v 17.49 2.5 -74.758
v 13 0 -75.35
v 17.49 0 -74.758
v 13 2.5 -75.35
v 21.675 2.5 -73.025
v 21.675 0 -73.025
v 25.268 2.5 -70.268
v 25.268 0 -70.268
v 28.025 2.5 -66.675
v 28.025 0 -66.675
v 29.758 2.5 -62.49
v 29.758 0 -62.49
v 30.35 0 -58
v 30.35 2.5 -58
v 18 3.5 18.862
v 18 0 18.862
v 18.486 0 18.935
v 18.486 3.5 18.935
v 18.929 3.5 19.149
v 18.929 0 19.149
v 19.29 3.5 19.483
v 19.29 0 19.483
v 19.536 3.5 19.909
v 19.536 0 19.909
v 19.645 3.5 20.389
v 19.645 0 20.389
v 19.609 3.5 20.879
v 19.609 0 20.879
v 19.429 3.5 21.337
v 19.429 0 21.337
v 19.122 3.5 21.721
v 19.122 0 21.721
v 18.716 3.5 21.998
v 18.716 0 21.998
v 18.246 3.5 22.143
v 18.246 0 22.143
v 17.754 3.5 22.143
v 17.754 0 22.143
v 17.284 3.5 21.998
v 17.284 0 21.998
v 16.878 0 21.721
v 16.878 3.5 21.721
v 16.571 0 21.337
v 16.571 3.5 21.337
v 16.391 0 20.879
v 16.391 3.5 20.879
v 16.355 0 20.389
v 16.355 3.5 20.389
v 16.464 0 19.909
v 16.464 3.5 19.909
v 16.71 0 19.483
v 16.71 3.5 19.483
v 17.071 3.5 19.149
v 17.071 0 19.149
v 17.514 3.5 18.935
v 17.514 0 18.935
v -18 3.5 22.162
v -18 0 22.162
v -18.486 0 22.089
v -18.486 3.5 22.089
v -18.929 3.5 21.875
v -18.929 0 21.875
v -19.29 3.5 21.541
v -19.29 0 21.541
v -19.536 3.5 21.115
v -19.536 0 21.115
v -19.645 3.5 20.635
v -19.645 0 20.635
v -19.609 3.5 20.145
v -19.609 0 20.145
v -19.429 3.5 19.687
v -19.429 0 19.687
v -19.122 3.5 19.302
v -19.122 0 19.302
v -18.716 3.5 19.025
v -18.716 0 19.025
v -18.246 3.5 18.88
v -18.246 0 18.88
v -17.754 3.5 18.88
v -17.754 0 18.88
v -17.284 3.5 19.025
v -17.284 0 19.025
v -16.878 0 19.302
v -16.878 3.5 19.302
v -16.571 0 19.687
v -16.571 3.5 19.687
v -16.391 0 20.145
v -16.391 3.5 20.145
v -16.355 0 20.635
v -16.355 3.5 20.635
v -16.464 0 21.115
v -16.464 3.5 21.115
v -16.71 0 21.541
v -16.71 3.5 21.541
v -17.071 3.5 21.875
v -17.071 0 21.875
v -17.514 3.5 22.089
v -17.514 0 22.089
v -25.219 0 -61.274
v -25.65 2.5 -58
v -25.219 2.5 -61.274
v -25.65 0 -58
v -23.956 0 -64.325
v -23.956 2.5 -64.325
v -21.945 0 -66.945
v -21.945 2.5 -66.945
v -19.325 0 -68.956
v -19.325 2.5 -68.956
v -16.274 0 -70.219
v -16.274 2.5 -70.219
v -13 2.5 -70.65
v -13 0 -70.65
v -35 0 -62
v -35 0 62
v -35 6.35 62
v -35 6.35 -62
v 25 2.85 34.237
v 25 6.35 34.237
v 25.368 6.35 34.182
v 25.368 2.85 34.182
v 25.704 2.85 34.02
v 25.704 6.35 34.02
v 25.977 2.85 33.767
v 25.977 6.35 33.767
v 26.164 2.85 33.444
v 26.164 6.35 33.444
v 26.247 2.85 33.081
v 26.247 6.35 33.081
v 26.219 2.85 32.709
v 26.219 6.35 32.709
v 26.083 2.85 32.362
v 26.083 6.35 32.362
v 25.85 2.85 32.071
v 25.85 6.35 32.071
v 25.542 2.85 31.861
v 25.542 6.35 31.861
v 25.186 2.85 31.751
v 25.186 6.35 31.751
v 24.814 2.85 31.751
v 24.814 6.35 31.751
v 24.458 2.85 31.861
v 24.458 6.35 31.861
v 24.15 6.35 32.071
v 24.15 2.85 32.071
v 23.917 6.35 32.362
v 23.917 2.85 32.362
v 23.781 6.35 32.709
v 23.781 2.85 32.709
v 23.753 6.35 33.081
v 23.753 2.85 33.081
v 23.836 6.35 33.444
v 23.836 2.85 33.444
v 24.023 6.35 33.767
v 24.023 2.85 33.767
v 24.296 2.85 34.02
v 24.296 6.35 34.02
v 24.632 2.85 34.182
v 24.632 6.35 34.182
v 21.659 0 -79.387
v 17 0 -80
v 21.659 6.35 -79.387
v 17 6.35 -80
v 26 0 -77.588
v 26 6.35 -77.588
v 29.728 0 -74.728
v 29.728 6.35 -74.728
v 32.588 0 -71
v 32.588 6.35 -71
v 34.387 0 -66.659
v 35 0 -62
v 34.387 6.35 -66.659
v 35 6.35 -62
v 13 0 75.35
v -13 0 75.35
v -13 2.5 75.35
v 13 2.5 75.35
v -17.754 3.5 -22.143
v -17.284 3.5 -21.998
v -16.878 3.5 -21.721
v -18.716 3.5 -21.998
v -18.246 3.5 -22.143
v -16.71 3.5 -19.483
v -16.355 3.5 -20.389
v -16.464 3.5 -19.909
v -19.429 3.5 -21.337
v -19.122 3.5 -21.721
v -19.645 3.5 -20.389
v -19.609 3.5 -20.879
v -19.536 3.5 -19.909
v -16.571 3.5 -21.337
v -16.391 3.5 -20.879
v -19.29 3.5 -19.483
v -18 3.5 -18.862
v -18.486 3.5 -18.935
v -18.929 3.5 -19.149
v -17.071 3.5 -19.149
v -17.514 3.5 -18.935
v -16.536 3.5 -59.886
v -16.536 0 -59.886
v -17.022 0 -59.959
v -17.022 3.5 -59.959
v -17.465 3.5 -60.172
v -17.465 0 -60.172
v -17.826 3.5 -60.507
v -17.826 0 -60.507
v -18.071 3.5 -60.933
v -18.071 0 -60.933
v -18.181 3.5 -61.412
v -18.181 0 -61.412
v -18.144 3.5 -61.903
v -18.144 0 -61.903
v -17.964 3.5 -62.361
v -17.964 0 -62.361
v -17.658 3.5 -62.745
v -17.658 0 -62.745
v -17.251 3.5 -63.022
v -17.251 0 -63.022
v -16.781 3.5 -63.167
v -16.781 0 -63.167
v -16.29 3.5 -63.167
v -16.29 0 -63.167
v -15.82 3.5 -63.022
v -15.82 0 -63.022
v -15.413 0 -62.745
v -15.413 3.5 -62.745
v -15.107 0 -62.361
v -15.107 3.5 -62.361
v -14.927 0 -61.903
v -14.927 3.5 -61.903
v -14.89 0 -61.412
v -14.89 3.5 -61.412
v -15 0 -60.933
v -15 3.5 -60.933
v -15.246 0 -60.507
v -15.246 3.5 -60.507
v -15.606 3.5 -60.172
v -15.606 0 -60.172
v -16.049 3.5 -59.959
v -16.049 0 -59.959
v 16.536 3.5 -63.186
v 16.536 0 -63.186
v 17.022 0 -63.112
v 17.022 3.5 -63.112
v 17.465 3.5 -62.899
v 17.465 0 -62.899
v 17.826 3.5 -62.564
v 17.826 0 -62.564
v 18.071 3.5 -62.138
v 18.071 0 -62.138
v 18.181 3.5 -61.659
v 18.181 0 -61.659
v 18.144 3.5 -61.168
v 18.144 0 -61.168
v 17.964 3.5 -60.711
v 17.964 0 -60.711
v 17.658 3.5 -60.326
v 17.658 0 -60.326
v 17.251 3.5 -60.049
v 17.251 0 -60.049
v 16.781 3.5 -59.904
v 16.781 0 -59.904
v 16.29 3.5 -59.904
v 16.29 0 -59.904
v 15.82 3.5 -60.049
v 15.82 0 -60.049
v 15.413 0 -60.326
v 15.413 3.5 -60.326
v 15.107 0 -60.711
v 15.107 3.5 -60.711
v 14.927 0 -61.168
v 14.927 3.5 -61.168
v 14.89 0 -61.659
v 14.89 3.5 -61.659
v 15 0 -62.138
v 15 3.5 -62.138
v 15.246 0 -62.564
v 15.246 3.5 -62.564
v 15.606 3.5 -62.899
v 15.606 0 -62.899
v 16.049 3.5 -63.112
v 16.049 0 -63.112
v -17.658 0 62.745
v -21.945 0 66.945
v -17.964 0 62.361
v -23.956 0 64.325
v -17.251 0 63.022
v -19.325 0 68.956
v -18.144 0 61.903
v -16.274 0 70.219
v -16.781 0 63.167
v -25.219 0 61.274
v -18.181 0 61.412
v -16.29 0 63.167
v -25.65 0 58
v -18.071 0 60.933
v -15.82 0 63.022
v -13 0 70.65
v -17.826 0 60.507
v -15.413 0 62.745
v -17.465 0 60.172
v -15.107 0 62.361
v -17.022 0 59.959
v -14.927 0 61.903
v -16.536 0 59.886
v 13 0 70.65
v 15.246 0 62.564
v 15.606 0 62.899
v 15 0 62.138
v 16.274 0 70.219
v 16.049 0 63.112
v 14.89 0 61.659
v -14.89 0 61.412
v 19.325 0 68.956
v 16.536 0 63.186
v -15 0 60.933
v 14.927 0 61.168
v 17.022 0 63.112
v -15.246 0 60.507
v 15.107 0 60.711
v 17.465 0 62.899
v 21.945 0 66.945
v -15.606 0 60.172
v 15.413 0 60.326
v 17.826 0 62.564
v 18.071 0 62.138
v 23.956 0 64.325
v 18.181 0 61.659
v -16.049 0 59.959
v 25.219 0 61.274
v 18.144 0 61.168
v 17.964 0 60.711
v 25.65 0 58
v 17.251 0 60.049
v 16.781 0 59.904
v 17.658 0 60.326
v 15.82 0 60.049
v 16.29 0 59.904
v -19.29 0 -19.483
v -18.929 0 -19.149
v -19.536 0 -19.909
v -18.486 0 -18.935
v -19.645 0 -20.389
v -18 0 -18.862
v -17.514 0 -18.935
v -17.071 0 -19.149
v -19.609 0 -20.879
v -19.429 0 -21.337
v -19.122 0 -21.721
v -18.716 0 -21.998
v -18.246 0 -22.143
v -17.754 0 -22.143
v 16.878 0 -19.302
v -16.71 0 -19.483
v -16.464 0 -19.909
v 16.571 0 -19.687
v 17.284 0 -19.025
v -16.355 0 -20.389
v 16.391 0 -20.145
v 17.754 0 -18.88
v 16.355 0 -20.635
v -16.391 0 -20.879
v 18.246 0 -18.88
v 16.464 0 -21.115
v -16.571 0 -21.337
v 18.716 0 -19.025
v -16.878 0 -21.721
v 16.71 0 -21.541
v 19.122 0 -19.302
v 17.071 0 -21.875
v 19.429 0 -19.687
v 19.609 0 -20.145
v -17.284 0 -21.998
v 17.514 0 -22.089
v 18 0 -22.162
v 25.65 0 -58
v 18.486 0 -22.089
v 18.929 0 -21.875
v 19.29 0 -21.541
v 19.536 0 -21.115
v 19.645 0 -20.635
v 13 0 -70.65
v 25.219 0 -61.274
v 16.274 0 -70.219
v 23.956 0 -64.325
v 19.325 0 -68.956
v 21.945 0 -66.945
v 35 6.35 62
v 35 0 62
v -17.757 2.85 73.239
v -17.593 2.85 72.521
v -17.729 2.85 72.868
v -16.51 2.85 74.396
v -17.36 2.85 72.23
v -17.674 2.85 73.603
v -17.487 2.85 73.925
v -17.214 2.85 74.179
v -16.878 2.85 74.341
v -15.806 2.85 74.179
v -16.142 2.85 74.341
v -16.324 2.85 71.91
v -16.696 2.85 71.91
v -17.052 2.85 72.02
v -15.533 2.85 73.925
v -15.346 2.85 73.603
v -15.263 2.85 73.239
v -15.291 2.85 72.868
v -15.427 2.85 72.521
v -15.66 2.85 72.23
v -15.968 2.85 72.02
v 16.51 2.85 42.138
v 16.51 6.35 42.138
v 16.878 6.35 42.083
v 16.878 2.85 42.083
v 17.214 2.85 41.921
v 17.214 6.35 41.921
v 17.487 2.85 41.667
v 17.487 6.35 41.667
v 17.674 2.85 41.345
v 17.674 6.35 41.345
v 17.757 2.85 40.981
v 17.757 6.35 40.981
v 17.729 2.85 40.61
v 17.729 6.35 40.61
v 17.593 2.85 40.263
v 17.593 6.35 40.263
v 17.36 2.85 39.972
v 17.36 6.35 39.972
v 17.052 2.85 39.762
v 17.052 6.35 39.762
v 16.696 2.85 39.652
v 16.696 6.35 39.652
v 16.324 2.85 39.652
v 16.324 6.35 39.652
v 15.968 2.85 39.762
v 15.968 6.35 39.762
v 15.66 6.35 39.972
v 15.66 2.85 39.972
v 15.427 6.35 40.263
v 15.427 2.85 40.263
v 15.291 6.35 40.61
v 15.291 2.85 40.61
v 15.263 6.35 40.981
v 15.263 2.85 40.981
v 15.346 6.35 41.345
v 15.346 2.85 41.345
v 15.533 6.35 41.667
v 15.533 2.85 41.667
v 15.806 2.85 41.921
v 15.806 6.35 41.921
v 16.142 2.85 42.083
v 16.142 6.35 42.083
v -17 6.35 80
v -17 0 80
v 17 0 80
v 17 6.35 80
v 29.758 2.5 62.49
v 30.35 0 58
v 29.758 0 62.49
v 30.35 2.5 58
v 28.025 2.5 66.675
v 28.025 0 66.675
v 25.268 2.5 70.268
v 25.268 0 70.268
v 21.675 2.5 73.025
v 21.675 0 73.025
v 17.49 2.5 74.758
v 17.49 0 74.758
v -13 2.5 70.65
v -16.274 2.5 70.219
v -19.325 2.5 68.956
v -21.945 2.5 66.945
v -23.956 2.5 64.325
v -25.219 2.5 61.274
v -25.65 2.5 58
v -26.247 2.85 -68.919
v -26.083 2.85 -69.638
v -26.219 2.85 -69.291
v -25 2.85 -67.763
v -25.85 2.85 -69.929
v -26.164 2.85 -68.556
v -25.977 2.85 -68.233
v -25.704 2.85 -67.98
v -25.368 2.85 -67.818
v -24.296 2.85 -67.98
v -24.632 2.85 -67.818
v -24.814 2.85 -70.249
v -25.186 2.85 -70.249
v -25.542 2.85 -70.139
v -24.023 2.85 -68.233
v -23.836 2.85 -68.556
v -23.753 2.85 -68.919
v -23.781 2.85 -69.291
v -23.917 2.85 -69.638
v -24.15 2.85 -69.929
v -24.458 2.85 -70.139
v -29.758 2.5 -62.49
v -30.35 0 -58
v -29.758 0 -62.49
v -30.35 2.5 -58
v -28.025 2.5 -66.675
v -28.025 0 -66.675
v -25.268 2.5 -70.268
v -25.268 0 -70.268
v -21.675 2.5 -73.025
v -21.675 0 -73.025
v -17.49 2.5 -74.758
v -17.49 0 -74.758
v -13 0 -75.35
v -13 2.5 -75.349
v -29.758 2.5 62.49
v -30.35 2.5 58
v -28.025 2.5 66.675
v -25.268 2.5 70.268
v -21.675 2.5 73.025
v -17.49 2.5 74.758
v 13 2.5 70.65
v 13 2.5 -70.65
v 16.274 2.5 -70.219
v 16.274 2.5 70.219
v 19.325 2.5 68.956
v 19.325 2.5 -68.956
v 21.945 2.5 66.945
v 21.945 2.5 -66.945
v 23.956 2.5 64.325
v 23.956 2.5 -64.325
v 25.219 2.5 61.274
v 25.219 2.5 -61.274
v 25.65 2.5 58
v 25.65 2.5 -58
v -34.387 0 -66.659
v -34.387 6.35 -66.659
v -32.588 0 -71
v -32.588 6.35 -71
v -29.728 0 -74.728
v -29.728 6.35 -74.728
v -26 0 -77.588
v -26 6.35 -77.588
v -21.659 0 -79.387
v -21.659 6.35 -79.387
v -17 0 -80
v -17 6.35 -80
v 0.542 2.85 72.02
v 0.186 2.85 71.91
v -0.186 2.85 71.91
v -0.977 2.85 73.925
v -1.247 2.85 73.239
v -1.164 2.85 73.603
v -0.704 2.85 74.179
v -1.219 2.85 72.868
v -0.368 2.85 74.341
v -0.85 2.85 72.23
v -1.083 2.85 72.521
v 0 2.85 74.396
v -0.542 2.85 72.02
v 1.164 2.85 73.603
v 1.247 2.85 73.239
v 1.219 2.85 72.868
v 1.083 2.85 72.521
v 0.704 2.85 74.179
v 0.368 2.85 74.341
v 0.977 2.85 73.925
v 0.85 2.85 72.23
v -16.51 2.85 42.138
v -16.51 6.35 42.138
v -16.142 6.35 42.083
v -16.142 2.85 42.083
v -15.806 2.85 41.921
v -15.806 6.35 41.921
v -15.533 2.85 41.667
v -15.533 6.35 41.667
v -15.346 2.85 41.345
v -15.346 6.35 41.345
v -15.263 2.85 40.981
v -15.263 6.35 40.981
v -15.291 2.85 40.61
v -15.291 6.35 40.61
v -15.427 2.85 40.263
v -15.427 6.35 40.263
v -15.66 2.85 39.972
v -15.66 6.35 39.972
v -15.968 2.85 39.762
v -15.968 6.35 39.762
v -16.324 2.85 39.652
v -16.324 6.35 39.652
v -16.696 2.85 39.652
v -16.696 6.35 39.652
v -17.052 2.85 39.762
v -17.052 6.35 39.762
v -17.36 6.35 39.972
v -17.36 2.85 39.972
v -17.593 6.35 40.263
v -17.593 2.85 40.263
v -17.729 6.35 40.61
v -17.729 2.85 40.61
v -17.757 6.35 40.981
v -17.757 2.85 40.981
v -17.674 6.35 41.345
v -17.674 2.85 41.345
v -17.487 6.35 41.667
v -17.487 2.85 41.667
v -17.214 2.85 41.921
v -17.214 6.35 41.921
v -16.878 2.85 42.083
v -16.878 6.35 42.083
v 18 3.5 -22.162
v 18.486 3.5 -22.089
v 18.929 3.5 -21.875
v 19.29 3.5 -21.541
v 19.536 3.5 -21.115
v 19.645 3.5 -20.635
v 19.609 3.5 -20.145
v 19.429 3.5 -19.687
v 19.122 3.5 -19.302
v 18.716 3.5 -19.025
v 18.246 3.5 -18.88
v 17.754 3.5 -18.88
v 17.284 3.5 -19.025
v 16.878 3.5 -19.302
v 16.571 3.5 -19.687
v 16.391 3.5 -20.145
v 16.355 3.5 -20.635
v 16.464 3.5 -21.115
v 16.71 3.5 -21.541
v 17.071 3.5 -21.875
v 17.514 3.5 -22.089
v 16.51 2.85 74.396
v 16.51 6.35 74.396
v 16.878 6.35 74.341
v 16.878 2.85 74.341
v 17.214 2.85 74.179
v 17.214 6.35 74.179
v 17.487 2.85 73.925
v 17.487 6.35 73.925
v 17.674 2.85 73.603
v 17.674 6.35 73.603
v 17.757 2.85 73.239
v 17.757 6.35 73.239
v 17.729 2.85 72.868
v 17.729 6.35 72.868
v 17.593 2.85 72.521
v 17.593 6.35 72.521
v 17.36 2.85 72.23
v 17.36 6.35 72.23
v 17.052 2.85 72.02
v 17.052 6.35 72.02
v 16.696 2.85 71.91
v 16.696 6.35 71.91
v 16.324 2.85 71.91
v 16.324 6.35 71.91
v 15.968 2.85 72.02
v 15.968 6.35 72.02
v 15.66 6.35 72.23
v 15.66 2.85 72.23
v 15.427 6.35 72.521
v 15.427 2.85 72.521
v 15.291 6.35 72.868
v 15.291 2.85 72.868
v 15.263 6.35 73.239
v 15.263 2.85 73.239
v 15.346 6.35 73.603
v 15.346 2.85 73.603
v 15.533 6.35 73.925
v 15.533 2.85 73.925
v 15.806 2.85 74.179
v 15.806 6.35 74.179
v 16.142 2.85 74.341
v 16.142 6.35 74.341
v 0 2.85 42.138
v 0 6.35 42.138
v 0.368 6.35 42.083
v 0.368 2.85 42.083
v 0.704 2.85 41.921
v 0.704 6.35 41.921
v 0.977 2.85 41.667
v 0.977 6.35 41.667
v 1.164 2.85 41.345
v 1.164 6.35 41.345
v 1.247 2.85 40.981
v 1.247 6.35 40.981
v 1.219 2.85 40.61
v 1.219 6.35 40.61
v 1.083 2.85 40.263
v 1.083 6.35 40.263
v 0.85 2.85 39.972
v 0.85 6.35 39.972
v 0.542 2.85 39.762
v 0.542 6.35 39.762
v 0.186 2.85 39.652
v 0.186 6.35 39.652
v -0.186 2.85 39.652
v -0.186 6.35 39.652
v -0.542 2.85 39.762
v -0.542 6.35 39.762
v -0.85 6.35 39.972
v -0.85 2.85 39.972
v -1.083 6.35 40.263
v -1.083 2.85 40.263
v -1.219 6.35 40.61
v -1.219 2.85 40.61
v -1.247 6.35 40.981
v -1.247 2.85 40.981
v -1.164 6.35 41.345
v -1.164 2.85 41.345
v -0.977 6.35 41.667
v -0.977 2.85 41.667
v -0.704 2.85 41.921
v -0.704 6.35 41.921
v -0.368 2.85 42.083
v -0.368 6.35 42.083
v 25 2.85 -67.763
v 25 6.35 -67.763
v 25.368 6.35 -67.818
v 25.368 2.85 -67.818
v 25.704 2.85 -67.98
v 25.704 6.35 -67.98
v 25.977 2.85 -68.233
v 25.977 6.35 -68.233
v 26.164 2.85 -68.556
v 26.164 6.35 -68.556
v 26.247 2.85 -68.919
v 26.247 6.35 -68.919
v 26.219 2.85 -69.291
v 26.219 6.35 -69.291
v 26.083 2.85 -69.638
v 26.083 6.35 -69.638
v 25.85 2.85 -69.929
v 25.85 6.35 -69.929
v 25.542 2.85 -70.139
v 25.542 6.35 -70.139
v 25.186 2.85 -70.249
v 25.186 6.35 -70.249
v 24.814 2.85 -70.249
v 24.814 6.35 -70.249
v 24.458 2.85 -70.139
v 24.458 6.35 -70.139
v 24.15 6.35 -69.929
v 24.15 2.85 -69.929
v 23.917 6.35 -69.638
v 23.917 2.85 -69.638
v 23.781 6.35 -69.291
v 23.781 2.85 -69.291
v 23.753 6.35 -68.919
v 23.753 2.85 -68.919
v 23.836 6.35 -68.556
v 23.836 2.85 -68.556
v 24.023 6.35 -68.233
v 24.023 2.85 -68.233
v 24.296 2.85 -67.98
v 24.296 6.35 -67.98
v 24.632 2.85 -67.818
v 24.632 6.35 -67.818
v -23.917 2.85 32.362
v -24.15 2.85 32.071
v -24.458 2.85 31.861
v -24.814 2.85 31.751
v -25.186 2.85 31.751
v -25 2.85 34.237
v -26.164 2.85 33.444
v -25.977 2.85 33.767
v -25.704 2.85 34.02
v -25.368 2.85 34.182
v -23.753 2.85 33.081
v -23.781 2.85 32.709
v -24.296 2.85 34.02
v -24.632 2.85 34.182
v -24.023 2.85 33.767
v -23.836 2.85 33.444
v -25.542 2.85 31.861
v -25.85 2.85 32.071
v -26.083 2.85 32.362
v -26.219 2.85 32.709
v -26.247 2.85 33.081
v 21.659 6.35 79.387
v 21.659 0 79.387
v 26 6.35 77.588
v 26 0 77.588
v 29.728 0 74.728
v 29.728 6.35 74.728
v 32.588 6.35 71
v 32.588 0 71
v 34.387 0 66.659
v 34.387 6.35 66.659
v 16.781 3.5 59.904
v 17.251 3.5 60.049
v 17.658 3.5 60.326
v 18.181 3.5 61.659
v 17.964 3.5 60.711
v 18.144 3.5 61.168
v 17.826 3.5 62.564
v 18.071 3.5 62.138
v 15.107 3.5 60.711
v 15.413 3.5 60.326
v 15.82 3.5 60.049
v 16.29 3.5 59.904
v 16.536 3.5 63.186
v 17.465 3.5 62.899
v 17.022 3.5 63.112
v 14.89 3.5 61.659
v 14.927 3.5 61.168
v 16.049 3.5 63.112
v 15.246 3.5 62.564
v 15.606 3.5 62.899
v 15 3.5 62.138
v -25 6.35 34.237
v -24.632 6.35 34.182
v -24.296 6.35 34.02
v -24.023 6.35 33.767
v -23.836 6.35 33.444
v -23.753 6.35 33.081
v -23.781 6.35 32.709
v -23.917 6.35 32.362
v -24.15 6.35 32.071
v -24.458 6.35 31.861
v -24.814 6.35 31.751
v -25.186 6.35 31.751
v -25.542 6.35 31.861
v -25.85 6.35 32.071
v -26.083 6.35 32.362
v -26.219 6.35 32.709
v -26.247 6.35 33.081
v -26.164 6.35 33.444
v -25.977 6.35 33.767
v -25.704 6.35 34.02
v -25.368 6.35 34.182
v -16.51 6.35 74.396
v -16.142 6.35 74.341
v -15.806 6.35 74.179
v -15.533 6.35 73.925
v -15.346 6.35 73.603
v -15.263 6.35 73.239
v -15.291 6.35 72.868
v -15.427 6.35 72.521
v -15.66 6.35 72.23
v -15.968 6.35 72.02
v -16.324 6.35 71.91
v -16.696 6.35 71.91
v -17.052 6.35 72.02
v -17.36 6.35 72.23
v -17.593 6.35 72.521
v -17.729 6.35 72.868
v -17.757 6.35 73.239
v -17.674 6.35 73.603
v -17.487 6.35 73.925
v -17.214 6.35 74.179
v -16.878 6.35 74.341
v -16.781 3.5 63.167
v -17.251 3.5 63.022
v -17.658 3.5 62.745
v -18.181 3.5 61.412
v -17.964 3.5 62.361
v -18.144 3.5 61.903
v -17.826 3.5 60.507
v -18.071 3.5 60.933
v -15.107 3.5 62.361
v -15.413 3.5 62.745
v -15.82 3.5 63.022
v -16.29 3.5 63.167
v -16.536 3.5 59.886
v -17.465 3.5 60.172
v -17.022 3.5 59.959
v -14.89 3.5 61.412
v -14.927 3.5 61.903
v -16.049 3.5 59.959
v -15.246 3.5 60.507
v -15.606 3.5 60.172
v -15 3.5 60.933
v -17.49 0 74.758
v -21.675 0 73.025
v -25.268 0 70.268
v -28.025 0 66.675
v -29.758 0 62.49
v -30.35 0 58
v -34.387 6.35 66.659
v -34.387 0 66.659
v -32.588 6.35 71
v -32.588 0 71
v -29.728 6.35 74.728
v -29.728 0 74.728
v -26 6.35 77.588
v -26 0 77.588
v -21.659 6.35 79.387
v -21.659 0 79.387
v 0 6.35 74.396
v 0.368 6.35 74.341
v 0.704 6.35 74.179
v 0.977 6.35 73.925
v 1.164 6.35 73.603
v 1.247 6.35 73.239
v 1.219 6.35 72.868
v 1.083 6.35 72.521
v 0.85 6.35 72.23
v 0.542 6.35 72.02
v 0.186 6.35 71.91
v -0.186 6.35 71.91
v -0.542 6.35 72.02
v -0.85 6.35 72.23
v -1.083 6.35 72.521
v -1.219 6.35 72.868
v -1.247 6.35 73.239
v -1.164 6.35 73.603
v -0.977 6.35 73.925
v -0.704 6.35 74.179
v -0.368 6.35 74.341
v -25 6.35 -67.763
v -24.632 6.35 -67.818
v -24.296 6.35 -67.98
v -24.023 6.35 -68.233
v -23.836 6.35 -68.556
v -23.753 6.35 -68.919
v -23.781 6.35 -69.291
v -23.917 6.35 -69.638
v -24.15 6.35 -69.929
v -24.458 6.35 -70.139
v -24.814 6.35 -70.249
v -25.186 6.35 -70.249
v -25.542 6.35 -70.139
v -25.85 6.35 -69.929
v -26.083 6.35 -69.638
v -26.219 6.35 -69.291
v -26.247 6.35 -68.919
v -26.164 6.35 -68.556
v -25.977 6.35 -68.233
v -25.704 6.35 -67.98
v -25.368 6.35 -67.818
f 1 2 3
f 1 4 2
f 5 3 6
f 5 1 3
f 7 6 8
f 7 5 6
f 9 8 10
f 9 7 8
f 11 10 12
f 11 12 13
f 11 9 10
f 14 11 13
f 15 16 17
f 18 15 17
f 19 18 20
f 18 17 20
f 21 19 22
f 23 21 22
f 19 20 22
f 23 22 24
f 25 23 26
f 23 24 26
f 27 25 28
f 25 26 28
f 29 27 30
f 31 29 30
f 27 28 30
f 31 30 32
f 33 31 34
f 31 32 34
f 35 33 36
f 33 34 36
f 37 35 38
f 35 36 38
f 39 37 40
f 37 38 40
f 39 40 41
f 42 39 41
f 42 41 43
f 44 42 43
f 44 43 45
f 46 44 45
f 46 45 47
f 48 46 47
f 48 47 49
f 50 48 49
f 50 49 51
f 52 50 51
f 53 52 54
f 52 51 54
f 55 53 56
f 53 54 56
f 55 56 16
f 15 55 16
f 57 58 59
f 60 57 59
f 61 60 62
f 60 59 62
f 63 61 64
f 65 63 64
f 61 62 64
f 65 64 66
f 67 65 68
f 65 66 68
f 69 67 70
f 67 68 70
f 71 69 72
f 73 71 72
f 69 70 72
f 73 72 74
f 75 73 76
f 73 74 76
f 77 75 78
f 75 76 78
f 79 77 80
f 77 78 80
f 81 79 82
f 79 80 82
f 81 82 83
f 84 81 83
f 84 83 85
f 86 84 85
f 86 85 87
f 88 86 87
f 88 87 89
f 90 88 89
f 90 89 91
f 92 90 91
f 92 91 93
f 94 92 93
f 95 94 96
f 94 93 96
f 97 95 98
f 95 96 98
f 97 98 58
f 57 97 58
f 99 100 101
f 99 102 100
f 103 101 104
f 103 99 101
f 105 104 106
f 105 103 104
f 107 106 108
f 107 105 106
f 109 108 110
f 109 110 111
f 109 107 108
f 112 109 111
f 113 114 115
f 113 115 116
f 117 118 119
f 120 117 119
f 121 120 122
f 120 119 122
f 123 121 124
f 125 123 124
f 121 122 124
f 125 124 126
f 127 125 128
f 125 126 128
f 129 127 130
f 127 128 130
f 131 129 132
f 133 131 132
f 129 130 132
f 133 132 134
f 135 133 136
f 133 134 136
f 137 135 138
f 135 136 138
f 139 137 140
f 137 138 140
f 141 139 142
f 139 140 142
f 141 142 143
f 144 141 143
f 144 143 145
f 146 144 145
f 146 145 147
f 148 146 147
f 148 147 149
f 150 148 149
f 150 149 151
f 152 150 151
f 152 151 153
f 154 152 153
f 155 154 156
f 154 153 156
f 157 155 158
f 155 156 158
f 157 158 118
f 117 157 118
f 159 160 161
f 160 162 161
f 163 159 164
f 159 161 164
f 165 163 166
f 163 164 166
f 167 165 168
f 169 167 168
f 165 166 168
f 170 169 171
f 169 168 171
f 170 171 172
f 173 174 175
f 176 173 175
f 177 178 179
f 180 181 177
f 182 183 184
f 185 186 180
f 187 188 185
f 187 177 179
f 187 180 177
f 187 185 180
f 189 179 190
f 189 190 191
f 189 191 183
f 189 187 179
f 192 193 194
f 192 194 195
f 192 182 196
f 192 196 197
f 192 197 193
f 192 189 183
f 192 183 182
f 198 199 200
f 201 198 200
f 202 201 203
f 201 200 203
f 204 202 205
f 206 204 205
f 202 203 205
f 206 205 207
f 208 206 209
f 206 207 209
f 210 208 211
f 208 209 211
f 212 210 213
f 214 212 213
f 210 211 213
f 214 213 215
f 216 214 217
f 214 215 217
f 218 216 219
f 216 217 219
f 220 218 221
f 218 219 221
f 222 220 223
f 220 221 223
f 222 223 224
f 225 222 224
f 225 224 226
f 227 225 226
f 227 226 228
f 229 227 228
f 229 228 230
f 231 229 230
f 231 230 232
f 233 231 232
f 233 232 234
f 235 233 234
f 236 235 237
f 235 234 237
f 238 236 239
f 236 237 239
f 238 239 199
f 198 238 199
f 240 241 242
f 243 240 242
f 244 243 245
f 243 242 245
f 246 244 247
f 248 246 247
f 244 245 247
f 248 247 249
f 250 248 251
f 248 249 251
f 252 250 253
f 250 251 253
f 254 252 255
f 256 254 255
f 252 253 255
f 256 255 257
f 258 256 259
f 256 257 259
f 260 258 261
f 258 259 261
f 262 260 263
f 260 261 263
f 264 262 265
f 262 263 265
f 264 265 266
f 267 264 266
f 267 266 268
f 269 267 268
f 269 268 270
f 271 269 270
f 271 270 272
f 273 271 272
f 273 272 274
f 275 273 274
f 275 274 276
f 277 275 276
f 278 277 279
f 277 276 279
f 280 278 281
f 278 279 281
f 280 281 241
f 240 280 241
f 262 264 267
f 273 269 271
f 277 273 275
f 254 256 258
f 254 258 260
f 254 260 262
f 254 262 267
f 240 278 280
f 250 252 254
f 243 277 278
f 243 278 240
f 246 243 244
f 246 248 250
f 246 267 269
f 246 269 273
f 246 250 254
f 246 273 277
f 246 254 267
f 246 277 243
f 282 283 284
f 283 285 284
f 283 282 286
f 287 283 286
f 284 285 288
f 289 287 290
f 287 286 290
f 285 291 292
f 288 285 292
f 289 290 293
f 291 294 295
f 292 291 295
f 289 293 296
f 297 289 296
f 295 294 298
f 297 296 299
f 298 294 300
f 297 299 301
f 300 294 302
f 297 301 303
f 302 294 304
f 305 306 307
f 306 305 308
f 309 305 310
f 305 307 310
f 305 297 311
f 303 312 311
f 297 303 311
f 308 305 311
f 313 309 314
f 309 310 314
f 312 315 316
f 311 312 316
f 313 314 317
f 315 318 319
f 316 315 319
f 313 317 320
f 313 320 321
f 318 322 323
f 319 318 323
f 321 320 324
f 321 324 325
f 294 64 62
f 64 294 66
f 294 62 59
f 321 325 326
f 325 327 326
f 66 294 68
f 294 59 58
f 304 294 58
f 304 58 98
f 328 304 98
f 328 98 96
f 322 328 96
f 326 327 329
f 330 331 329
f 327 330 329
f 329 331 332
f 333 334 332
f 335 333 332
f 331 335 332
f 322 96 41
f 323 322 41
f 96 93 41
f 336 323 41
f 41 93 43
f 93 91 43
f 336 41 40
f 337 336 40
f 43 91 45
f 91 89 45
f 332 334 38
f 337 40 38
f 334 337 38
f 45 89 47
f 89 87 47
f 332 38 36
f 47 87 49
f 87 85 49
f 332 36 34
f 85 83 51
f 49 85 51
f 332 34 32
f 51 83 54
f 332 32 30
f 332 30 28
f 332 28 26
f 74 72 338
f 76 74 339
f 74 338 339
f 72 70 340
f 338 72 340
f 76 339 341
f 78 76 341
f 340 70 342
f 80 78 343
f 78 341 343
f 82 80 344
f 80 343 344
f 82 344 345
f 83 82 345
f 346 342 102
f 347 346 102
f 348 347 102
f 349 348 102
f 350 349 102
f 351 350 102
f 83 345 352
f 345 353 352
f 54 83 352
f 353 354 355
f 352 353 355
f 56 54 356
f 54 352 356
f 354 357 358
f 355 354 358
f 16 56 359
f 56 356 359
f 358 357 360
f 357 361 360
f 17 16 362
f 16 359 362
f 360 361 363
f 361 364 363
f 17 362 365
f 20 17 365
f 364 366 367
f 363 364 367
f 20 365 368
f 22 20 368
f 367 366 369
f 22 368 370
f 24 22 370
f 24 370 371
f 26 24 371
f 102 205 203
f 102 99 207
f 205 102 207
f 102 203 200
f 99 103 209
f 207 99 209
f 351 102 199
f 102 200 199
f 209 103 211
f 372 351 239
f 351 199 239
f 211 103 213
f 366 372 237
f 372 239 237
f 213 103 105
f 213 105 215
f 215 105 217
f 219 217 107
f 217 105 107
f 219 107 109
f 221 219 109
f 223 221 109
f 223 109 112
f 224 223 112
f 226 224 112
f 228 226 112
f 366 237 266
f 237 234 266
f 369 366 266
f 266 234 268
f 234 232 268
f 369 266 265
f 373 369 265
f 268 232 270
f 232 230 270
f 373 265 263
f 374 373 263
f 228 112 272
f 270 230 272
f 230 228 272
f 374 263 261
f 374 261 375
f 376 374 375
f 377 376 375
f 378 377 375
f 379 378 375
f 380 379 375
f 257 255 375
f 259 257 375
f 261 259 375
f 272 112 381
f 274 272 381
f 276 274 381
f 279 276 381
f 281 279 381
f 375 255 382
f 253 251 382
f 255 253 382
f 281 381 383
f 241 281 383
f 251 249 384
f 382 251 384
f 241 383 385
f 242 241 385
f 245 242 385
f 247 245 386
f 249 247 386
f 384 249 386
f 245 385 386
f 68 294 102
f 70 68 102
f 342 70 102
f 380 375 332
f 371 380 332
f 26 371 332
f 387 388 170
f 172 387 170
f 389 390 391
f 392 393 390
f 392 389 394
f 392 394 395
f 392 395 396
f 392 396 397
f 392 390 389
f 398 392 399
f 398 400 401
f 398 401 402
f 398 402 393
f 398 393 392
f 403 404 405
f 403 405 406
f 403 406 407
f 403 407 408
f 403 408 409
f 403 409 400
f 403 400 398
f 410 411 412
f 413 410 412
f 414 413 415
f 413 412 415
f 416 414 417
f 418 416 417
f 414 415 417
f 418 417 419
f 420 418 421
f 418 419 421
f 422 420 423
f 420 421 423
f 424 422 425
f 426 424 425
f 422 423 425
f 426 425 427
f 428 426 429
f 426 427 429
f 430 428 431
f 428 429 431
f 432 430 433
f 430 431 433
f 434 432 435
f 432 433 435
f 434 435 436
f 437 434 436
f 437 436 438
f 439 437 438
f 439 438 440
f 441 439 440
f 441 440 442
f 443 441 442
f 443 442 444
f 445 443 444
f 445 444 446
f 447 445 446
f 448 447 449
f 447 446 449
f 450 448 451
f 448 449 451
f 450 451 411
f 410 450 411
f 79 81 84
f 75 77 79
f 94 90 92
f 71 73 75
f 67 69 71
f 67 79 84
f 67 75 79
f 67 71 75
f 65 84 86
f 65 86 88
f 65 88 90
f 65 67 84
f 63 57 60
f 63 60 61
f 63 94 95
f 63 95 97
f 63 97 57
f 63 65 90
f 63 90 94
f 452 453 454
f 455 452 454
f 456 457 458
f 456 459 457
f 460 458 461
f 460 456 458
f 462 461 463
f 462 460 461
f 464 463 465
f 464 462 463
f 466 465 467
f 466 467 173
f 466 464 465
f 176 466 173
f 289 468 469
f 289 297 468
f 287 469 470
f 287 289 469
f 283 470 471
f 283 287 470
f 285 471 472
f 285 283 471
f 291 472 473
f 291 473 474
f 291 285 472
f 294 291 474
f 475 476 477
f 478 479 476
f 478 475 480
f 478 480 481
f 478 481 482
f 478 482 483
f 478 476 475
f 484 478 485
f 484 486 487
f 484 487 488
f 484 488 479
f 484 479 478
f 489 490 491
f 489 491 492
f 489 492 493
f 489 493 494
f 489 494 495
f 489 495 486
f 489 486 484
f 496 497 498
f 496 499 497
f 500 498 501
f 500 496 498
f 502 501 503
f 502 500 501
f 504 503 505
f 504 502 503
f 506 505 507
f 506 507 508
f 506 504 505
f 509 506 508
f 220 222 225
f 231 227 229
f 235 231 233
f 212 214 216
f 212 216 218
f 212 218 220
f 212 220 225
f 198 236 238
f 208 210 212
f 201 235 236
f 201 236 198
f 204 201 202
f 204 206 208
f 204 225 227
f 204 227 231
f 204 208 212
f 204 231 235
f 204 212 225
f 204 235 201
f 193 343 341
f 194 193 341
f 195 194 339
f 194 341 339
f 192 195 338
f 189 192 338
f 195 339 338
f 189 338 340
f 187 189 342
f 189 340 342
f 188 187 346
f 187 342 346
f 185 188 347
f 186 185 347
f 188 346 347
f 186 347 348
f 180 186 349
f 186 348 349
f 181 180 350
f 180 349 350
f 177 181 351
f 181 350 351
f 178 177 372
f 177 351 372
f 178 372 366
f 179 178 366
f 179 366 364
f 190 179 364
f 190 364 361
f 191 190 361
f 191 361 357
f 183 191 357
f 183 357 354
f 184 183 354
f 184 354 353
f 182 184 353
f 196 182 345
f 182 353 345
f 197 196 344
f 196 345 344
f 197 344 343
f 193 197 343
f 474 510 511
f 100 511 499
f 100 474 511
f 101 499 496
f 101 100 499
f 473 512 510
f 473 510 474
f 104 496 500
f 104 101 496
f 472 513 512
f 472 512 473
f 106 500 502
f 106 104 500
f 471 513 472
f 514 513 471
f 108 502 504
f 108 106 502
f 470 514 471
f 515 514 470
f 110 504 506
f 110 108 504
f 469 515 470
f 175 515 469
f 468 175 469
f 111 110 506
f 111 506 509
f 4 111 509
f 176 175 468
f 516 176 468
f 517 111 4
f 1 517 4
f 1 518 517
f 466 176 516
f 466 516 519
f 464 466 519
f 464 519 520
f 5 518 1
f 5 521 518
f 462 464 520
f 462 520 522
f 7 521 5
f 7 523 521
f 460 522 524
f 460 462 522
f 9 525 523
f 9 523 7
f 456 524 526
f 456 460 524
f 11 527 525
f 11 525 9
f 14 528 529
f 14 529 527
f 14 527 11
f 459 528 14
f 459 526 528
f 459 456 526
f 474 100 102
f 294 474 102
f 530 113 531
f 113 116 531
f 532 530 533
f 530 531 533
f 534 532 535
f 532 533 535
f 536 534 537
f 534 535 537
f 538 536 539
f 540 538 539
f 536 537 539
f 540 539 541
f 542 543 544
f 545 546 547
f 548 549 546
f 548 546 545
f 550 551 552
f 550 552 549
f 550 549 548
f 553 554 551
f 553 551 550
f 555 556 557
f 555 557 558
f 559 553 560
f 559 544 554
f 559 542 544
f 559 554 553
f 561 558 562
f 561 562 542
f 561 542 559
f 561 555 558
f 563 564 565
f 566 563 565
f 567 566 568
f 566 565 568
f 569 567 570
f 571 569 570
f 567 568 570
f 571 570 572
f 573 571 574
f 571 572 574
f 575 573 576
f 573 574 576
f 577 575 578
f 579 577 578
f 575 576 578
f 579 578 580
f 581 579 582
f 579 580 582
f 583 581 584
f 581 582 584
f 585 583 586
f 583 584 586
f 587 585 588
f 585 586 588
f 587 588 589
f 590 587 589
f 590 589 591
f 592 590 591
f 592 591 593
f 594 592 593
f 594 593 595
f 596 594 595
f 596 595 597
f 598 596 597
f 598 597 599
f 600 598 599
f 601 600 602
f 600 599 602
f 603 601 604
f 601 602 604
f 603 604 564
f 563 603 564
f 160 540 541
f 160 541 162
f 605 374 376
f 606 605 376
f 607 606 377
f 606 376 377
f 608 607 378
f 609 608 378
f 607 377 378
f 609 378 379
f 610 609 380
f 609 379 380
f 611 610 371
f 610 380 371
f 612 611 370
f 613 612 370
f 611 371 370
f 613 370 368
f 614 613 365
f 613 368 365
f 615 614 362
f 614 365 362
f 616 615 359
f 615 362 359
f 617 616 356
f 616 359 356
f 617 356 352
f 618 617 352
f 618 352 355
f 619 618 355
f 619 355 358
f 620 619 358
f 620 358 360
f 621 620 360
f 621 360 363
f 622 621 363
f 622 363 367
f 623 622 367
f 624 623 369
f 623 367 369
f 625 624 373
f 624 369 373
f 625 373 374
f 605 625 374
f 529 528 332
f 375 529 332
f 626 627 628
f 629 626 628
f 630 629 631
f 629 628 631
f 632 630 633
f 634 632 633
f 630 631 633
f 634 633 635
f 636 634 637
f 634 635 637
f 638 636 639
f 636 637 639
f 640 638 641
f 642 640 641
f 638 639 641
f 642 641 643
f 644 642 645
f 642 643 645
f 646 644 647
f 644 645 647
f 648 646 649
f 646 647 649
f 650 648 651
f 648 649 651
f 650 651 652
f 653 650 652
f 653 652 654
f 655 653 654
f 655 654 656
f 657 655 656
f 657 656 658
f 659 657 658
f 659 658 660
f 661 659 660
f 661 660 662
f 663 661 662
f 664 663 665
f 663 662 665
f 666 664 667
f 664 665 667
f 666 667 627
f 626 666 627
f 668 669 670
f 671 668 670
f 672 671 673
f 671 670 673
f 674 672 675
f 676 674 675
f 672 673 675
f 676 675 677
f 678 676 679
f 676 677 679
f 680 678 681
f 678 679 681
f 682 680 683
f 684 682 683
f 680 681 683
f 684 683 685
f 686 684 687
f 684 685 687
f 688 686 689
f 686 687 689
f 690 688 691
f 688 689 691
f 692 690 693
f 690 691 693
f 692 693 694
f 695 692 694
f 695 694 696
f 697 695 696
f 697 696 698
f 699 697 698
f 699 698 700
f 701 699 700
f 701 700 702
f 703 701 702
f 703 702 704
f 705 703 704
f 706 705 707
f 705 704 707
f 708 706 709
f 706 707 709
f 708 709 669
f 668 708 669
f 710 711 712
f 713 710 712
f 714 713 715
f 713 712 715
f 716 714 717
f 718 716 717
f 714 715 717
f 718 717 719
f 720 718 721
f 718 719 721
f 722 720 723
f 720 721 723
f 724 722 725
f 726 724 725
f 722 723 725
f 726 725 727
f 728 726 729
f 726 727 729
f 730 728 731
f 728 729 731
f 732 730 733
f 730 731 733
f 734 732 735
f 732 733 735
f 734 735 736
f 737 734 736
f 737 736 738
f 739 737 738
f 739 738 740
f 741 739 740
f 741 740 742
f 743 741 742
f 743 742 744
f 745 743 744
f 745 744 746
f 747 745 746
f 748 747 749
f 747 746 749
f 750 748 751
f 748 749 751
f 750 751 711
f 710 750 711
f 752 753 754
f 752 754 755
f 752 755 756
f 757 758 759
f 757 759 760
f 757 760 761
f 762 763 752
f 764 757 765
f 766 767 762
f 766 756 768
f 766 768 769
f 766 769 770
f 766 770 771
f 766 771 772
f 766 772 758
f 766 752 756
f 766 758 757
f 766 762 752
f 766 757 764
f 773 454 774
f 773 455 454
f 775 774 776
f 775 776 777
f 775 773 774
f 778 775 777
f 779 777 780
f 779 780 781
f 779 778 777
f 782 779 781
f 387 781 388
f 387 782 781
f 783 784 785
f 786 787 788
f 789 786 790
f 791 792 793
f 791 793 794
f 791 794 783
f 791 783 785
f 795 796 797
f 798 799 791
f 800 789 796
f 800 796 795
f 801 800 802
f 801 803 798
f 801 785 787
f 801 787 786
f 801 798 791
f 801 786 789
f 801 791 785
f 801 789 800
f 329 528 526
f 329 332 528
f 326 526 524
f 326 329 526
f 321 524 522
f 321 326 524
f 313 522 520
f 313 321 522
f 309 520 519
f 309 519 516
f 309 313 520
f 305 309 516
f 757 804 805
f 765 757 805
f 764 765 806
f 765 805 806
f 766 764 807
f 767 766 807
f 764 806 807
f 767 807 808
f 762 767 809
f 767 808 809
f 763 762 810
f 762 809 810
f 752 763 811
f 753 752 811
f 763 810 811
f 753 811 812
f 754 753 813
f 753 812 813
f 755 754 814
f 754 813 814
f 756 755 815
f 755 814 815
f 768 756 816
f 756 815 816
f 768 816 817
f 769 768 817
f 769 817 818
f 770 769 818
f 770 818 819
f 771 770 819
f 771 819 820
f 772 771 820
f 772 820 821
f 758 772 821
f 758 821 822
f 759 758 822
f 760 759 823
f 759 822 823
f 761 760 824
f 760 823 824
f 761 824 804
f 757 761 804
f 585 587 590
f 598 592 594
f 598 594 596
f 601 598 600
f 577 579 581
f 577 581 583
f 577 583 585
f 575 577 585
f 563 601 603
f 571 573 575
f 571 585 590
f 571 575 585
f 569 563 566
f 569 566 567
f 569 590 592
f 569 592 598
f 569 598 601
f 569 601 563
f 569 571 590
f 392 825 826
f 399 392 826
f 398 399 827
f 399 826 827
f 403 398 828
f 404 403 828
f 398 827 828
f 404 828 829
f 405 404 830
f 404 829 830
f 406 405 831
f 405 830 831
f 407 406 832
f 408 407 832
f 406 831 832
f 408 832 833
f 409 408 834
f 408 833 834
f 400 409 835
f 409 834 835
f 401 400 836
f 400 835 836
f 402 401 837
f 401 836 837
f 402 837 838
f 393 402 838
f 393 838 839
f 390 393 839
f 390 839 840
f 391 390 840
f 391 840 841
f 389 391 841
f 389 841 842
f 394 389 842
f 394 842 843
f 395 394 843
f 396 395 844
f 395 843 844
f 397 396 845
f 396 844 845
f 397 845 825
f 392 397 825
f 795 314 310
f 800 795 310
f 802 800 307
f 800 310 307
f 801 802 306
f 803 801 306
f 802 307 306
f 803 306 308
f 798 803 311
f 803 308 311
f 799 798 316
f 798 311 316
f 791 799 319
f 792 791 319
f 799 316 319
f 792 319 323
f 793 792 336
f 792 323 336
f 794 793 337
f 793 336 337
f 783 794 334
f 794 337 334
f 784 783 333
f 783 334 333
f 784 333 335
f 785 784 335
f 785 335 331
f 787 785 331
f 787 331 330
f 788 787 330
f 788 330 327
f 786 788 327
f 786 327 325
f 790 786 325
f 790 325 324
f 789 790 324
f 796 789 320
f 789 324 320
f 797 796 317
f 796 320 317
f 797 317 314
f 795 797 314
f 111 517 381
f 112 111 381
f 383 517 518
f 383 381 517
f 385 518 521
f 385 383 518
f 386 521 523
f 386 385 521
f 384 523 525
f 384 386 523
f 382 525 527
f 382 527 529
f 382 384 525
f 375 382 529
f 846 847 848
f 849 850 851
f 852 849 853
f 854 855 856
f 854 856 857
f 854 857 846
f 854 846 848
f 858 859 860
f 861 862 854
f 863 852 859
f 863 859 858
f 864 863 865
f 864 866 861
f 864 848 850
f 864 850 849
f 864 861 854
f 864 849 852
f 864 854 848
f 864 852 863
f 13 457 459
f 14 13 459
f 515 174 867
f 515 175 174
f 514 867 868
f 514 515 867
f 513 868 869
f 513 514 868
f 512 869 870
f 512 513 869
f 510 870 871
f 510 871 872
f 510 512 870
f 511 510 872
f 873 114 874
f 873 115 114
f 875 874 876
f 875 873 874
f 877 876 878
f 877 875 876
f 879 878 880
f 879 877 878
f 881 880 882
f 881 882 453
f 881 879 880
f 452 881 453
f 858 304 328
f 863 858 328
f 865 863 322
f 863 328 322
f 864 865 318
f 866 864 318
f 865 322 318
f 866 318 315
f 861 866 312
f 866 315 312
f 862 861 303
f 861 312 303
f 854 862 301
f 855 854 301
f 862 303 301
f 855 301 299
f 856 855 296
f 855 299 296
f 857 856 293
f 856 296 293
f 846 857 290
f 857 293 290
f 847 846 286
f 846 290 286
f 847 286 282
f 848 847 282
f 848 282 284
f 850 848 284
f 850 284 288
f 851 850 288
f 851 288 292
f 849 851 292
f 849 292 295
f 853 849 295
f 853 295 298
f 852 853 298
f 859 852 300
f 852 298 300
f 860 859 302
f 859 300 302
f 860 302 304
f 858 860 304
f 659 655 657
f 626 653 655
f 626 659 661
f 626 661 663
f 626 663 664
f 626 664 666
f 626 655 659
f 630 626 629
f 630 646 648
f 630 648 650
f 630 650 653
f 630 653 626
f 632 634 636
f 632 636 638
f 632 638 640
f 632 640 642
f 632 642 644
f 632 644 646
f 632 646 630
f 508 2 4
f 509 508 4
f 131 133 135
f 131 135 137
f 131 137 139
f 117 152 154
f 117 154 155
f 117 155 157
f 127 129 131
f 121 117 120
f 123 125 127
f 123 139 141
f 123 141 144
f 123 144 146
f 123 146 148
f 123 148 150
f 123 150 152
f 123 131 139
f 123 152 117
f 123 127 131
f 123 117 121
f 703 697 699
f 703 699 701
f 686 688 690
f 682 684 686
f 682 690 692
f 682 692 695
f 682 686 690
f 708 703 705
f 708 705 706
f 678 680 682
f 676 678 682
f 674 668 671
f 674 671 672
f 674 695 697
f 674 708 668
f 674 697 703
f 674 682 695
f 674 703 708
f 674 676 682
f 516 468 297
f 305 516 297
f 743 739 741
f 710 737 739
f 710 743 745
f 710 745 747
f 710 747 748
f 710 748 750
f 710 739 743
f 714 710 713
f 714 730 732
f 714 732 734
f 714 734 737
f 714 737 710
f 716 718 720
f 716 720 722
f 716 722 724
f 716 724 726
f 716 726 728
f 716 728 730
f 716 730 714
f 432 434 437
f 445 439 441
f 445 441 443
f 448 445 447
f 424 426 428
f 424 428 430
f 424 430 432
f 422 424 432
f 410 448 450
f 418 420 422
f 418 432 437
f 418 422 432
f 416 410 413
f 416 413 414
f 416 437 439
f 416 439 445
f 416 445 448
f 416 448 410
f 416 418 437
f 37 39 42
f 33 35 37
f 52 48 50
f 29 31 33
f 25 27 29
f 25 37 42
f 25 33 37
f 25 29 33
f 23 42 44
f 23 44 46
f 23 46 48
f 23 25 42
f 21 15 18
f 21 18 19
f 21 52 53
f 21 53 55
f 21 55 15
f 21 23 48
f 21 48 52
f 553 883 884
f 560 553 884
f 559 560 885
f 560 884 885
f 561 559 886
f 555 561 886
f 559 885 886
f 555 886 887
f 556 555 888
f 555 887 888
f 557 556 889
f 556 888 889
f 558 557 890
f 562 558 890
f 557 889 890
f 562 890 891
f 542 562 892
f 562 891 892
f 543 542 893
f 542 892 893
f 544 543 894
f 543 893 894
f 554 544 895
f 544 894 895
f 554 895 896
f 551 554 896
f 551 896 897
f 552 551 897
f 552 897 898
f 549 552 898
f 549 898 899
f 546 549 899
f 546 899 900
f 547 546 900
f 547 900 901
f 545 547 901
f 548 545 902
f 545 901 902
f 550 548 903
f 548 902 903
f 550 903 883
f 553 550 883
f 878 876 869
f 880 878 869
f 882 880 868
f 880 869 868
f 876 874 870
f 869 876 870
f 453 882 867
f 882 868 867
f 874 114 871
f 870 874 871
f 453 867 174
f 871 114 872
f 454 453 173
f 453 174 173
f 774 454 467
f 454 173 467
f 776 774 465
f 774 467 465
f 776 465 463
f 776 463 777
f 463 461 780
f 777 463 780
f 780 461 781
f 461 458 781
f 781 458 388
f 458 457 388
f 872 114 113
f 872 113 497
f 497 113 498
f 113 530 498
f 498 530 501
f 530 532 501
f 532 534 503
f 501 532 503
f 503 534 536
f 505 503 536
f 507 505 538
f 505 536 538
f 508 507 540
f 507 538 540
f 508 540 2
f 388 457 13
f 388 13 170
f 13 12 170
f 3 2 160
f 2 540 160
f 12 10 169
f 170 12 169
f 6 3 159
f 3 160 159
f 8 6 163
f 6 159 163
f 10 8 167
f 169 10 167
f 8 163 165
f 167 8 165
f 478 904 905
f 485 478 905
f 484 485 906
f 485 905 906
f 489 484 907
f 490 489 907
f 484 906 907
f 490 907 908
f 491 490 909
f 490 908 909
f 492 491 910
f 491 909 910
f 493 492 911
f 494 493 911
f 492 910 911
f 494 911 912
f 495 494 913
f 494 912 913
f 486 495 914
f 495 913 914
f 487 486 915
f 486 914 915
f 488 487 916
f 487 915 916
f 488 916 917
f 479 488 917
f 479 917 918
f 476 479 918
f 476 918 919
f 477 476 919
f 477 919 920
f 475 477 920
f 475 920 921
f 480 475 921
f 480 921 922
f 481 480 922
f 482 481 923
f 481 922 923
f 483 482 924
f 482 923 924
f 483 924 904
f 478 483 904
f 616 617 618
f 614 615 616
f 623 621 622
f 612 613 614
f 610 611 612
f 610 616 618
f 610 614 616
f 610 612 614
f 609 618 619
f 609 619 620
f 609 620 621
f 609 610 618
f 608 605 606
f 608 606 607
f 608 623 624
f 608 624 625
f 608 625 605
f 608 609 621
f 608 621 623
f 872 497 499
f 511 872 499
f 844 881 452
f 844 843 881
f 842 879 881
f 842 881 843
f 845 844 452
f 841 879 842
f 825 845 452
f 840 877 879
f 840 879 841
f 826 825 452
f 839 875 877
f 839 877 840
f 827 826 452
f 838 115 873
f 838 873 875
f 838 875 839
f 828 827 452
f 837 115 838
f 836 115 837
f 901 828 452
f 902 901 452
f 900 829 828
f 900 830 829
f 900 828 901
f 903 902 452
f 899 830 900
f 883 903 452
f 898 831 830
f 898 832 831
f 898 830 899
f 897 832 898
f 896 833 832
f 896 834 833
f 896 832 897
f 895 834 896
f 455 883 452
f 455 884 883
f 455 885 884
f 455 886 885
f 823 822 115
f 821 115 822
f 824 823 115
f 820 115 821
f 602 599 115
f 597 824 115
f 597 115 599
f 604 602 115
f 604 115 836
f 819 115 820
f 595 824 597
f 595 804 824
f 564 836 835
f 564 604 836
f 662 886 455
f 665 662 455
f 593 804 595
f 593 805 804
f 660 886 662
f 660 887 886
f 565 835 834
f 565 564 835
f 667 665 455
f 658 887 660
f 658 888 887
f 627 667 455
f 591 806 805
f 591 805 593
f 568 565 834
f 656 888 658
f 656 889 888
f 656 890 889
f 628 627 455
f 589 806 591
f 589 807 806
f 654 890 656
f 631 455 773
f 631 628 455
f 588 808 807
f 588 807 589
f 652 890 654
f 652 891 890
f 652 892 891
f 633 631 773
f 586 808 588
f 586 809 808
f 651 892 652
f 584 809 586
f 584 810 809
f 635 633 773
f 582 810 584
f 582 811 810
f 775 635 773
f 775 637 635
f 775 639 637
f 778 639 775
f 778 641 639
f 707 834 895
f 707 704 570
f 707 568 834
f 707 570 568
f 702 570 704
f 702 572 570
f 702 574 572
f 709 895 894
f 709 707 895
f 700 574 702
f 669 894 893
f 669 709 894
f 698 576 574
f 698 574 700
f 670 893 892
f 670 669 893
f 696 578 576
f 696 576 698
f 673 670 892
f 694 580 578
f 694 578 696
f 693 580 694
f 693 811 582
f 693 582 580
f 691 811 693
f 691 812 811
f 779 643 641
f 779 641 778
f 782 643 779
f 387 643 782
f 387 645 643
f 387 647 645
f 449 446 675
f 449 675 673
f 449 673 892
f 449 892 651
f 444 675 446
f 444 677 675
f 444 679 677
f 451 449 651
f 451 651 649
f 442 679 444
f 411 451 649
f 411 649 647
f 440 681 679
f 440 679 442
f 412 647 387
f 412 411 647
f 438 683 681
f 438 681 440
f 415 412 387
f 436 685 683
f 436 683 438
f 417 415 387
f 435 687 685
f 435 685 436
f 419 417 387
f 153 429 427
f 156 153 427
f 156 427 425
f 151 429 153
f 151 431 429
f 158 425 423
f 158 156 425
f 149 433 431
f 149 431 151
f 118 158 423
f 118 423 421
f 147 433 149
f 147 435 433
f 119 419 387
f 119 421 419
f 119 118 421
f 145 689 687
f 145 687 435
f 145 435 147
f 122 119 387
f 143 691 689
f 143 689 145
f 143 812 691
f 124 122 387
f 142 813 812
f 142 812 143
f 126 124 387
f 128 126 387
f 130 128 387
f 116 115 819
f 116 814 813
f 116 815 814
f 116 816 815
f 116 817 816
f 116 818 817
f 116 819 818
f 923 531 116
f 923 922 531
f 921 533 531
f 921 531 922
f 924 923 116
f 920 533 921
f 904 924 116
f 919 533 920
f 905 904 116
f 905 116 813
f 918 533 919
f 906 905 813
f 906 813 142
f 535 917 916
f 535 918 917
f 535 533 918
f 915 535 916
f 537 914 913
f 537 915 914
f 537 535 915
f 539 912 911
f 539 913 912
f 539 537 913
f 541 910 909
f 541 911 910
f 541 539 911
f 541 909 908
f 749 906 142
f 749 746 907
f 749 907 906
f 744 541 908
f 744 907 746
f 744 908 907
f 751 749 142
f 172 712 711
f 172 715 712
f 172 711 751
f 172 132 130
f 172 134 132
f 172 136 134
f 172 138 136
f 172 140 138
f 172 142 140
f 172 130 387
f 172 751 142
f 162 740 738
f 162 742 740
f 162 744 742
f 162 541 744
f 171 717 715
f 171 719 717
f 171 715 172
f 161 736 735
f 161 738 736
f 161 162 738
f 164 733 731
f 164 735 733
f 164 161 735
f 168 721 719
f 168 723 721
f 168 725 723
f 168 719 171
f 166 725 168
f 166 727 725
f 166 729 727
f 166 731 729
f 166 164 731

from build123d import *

# Parameters (mm, degrees)
SKETCH1_W           = 70
SKETCH1_H           = 160
BOSS_EXTRUDE1_DEPTH = 6.35
SKETCH7_W           = 4.699
SKETCH7_H           = 2.5
FILLET1_R           = 18
SKETCH11_R          = 1.65
CUT_EXTRUDE4_DEPTH  = 3.5
SKETCH14_R          = 1.25
CUT_EXTRUDE7_DEPTH  = 3.5


with BuildPart() as part:
    # Sketch1 → Boss-Extrude1 (new body)
    with BuildSketch(Plane(origin=(0, 0, 0), x_dir=(1, 0, 0), z_dir=(0, 1, 0))):
        Rectangle(SKETCH1_W, SKETCH1_H)
    extrude(amount=BOSS_EXTRUDE1_DEPTH)

    # Cut-Sweep2: sweep along a path in Sketch2
    with BuildLine(Plane(origin=(0, 0, 0), x_dir=(1, 0, 0), z_dir=(0, 1, 0))) as cut_sweep2_path:
        Line((-13, 73), (13, 73))
        ThreePointArc((13, 73), (23.606601718, 68.606601718), (28, 58))
        Line((28, 58), (28, -58))
        ThreePointArc((28, -58), (23.606601718, -68.606601718), (13, -73))
        Line((13, -73), (-13, -73))
        ThreePointArc((-13, -73), (-23.606601718, -68.606601718), (-28, -58))
        Line((-28, -58), (-28, 58))
        ThreePointArc((-28, 58), (-23.606601718, 68.606601718), (-13, 73))
    # Sketch7 → Cut-Sweep2 (sweep, cut)
    with BuildSketch(Plane.XY):
        with Locations((28, 1.25)):
            Rectangle(SKETCH7_W, SKETCH7_H)
    sweep(path=cut_sweep2_path.line, mode=Mode.SUBTRACT)

    # Fillet1
    fillet1_edges = [part.edges().sort_by_distance(p)[0] for p in [
        (-35, 3.175, 80),
        (-35, 3.175, -80),
        (35, 3.175, -80),
        (35, 3.175, 80),
    ]]
    fillet(fillet1_edges, radius=FILLET1_R)

    # Sketch11 → Cut-Extrude4 (cut)
    with BuildSketch(Plane.XZ):
        with Locations((16.535533906, 61.535533906)):
            Circle(SKETCH11_R)
        with Locations((18, -20.511844635)):
            Circle(SKETCH11_R)
        with Locations((18, 20.511844635)):
            Circle(SKETCH11_R)
        with Locations((-16.535533906, 61.535533906)):
            Circle(SKETCH11_R)
        with Locations((-18, 20.511844635)):
            Circle(SKETCH11_R)
        with Locations((16.535533906, -61.535533906)):
            Circle(SKETCH11_R)
        with Locations((-18, -20.511844635)):
            Circle(SKETCH11_R)
        with Locations((-16.535533906, -61.535533906)):
            Circle(SKETCH11_R)
    extrude(amount=-CUT_EXTRUDE4_DEPTH, mode=Mode.SUBTRACT)

    # Sketch14 → Cut-Extrude7 (cut)
    with BuildSketch(Plane(origin=(0, 6.35, 0), x_dir=(1, 0, 0), z_dir=(0, 1, 0))):
        with Locations((-16.51, -40.888057962)):
            Circle(SKETCH14_R)
        with Locations((0, -40.888057962)):
            Circle(SKETCH14_R)
        with Locations((16.51, -40.888057962)):
            Circle(SKETCH14_R)
        with Locations((16.51, -73.146057962)):
            Circle(SKETCH14_R)
        with Locations((0, -73.146057962)):
            Circle(SKETCH14_R)
        with Locations((-16.51, -73.146057962)):
            Circle(SKETCH14_R)
        with Locations((-25, -32.987253412)):
            Circle(SKETCH14_R)
        with Locations((25, -32.987253412)):
            Circle(SKETCH14_R)
        with Locations((25, 69.012746588)):
            Circle(SKETCH14_R)
        with Locations((-25, 69.012746588)):
            Circle(SKETCH14_R)
    extrude(amount=-CUT_EXTRUDE7_DEPTH, mode=Mode.SUBTRACT)


solid = part.part
